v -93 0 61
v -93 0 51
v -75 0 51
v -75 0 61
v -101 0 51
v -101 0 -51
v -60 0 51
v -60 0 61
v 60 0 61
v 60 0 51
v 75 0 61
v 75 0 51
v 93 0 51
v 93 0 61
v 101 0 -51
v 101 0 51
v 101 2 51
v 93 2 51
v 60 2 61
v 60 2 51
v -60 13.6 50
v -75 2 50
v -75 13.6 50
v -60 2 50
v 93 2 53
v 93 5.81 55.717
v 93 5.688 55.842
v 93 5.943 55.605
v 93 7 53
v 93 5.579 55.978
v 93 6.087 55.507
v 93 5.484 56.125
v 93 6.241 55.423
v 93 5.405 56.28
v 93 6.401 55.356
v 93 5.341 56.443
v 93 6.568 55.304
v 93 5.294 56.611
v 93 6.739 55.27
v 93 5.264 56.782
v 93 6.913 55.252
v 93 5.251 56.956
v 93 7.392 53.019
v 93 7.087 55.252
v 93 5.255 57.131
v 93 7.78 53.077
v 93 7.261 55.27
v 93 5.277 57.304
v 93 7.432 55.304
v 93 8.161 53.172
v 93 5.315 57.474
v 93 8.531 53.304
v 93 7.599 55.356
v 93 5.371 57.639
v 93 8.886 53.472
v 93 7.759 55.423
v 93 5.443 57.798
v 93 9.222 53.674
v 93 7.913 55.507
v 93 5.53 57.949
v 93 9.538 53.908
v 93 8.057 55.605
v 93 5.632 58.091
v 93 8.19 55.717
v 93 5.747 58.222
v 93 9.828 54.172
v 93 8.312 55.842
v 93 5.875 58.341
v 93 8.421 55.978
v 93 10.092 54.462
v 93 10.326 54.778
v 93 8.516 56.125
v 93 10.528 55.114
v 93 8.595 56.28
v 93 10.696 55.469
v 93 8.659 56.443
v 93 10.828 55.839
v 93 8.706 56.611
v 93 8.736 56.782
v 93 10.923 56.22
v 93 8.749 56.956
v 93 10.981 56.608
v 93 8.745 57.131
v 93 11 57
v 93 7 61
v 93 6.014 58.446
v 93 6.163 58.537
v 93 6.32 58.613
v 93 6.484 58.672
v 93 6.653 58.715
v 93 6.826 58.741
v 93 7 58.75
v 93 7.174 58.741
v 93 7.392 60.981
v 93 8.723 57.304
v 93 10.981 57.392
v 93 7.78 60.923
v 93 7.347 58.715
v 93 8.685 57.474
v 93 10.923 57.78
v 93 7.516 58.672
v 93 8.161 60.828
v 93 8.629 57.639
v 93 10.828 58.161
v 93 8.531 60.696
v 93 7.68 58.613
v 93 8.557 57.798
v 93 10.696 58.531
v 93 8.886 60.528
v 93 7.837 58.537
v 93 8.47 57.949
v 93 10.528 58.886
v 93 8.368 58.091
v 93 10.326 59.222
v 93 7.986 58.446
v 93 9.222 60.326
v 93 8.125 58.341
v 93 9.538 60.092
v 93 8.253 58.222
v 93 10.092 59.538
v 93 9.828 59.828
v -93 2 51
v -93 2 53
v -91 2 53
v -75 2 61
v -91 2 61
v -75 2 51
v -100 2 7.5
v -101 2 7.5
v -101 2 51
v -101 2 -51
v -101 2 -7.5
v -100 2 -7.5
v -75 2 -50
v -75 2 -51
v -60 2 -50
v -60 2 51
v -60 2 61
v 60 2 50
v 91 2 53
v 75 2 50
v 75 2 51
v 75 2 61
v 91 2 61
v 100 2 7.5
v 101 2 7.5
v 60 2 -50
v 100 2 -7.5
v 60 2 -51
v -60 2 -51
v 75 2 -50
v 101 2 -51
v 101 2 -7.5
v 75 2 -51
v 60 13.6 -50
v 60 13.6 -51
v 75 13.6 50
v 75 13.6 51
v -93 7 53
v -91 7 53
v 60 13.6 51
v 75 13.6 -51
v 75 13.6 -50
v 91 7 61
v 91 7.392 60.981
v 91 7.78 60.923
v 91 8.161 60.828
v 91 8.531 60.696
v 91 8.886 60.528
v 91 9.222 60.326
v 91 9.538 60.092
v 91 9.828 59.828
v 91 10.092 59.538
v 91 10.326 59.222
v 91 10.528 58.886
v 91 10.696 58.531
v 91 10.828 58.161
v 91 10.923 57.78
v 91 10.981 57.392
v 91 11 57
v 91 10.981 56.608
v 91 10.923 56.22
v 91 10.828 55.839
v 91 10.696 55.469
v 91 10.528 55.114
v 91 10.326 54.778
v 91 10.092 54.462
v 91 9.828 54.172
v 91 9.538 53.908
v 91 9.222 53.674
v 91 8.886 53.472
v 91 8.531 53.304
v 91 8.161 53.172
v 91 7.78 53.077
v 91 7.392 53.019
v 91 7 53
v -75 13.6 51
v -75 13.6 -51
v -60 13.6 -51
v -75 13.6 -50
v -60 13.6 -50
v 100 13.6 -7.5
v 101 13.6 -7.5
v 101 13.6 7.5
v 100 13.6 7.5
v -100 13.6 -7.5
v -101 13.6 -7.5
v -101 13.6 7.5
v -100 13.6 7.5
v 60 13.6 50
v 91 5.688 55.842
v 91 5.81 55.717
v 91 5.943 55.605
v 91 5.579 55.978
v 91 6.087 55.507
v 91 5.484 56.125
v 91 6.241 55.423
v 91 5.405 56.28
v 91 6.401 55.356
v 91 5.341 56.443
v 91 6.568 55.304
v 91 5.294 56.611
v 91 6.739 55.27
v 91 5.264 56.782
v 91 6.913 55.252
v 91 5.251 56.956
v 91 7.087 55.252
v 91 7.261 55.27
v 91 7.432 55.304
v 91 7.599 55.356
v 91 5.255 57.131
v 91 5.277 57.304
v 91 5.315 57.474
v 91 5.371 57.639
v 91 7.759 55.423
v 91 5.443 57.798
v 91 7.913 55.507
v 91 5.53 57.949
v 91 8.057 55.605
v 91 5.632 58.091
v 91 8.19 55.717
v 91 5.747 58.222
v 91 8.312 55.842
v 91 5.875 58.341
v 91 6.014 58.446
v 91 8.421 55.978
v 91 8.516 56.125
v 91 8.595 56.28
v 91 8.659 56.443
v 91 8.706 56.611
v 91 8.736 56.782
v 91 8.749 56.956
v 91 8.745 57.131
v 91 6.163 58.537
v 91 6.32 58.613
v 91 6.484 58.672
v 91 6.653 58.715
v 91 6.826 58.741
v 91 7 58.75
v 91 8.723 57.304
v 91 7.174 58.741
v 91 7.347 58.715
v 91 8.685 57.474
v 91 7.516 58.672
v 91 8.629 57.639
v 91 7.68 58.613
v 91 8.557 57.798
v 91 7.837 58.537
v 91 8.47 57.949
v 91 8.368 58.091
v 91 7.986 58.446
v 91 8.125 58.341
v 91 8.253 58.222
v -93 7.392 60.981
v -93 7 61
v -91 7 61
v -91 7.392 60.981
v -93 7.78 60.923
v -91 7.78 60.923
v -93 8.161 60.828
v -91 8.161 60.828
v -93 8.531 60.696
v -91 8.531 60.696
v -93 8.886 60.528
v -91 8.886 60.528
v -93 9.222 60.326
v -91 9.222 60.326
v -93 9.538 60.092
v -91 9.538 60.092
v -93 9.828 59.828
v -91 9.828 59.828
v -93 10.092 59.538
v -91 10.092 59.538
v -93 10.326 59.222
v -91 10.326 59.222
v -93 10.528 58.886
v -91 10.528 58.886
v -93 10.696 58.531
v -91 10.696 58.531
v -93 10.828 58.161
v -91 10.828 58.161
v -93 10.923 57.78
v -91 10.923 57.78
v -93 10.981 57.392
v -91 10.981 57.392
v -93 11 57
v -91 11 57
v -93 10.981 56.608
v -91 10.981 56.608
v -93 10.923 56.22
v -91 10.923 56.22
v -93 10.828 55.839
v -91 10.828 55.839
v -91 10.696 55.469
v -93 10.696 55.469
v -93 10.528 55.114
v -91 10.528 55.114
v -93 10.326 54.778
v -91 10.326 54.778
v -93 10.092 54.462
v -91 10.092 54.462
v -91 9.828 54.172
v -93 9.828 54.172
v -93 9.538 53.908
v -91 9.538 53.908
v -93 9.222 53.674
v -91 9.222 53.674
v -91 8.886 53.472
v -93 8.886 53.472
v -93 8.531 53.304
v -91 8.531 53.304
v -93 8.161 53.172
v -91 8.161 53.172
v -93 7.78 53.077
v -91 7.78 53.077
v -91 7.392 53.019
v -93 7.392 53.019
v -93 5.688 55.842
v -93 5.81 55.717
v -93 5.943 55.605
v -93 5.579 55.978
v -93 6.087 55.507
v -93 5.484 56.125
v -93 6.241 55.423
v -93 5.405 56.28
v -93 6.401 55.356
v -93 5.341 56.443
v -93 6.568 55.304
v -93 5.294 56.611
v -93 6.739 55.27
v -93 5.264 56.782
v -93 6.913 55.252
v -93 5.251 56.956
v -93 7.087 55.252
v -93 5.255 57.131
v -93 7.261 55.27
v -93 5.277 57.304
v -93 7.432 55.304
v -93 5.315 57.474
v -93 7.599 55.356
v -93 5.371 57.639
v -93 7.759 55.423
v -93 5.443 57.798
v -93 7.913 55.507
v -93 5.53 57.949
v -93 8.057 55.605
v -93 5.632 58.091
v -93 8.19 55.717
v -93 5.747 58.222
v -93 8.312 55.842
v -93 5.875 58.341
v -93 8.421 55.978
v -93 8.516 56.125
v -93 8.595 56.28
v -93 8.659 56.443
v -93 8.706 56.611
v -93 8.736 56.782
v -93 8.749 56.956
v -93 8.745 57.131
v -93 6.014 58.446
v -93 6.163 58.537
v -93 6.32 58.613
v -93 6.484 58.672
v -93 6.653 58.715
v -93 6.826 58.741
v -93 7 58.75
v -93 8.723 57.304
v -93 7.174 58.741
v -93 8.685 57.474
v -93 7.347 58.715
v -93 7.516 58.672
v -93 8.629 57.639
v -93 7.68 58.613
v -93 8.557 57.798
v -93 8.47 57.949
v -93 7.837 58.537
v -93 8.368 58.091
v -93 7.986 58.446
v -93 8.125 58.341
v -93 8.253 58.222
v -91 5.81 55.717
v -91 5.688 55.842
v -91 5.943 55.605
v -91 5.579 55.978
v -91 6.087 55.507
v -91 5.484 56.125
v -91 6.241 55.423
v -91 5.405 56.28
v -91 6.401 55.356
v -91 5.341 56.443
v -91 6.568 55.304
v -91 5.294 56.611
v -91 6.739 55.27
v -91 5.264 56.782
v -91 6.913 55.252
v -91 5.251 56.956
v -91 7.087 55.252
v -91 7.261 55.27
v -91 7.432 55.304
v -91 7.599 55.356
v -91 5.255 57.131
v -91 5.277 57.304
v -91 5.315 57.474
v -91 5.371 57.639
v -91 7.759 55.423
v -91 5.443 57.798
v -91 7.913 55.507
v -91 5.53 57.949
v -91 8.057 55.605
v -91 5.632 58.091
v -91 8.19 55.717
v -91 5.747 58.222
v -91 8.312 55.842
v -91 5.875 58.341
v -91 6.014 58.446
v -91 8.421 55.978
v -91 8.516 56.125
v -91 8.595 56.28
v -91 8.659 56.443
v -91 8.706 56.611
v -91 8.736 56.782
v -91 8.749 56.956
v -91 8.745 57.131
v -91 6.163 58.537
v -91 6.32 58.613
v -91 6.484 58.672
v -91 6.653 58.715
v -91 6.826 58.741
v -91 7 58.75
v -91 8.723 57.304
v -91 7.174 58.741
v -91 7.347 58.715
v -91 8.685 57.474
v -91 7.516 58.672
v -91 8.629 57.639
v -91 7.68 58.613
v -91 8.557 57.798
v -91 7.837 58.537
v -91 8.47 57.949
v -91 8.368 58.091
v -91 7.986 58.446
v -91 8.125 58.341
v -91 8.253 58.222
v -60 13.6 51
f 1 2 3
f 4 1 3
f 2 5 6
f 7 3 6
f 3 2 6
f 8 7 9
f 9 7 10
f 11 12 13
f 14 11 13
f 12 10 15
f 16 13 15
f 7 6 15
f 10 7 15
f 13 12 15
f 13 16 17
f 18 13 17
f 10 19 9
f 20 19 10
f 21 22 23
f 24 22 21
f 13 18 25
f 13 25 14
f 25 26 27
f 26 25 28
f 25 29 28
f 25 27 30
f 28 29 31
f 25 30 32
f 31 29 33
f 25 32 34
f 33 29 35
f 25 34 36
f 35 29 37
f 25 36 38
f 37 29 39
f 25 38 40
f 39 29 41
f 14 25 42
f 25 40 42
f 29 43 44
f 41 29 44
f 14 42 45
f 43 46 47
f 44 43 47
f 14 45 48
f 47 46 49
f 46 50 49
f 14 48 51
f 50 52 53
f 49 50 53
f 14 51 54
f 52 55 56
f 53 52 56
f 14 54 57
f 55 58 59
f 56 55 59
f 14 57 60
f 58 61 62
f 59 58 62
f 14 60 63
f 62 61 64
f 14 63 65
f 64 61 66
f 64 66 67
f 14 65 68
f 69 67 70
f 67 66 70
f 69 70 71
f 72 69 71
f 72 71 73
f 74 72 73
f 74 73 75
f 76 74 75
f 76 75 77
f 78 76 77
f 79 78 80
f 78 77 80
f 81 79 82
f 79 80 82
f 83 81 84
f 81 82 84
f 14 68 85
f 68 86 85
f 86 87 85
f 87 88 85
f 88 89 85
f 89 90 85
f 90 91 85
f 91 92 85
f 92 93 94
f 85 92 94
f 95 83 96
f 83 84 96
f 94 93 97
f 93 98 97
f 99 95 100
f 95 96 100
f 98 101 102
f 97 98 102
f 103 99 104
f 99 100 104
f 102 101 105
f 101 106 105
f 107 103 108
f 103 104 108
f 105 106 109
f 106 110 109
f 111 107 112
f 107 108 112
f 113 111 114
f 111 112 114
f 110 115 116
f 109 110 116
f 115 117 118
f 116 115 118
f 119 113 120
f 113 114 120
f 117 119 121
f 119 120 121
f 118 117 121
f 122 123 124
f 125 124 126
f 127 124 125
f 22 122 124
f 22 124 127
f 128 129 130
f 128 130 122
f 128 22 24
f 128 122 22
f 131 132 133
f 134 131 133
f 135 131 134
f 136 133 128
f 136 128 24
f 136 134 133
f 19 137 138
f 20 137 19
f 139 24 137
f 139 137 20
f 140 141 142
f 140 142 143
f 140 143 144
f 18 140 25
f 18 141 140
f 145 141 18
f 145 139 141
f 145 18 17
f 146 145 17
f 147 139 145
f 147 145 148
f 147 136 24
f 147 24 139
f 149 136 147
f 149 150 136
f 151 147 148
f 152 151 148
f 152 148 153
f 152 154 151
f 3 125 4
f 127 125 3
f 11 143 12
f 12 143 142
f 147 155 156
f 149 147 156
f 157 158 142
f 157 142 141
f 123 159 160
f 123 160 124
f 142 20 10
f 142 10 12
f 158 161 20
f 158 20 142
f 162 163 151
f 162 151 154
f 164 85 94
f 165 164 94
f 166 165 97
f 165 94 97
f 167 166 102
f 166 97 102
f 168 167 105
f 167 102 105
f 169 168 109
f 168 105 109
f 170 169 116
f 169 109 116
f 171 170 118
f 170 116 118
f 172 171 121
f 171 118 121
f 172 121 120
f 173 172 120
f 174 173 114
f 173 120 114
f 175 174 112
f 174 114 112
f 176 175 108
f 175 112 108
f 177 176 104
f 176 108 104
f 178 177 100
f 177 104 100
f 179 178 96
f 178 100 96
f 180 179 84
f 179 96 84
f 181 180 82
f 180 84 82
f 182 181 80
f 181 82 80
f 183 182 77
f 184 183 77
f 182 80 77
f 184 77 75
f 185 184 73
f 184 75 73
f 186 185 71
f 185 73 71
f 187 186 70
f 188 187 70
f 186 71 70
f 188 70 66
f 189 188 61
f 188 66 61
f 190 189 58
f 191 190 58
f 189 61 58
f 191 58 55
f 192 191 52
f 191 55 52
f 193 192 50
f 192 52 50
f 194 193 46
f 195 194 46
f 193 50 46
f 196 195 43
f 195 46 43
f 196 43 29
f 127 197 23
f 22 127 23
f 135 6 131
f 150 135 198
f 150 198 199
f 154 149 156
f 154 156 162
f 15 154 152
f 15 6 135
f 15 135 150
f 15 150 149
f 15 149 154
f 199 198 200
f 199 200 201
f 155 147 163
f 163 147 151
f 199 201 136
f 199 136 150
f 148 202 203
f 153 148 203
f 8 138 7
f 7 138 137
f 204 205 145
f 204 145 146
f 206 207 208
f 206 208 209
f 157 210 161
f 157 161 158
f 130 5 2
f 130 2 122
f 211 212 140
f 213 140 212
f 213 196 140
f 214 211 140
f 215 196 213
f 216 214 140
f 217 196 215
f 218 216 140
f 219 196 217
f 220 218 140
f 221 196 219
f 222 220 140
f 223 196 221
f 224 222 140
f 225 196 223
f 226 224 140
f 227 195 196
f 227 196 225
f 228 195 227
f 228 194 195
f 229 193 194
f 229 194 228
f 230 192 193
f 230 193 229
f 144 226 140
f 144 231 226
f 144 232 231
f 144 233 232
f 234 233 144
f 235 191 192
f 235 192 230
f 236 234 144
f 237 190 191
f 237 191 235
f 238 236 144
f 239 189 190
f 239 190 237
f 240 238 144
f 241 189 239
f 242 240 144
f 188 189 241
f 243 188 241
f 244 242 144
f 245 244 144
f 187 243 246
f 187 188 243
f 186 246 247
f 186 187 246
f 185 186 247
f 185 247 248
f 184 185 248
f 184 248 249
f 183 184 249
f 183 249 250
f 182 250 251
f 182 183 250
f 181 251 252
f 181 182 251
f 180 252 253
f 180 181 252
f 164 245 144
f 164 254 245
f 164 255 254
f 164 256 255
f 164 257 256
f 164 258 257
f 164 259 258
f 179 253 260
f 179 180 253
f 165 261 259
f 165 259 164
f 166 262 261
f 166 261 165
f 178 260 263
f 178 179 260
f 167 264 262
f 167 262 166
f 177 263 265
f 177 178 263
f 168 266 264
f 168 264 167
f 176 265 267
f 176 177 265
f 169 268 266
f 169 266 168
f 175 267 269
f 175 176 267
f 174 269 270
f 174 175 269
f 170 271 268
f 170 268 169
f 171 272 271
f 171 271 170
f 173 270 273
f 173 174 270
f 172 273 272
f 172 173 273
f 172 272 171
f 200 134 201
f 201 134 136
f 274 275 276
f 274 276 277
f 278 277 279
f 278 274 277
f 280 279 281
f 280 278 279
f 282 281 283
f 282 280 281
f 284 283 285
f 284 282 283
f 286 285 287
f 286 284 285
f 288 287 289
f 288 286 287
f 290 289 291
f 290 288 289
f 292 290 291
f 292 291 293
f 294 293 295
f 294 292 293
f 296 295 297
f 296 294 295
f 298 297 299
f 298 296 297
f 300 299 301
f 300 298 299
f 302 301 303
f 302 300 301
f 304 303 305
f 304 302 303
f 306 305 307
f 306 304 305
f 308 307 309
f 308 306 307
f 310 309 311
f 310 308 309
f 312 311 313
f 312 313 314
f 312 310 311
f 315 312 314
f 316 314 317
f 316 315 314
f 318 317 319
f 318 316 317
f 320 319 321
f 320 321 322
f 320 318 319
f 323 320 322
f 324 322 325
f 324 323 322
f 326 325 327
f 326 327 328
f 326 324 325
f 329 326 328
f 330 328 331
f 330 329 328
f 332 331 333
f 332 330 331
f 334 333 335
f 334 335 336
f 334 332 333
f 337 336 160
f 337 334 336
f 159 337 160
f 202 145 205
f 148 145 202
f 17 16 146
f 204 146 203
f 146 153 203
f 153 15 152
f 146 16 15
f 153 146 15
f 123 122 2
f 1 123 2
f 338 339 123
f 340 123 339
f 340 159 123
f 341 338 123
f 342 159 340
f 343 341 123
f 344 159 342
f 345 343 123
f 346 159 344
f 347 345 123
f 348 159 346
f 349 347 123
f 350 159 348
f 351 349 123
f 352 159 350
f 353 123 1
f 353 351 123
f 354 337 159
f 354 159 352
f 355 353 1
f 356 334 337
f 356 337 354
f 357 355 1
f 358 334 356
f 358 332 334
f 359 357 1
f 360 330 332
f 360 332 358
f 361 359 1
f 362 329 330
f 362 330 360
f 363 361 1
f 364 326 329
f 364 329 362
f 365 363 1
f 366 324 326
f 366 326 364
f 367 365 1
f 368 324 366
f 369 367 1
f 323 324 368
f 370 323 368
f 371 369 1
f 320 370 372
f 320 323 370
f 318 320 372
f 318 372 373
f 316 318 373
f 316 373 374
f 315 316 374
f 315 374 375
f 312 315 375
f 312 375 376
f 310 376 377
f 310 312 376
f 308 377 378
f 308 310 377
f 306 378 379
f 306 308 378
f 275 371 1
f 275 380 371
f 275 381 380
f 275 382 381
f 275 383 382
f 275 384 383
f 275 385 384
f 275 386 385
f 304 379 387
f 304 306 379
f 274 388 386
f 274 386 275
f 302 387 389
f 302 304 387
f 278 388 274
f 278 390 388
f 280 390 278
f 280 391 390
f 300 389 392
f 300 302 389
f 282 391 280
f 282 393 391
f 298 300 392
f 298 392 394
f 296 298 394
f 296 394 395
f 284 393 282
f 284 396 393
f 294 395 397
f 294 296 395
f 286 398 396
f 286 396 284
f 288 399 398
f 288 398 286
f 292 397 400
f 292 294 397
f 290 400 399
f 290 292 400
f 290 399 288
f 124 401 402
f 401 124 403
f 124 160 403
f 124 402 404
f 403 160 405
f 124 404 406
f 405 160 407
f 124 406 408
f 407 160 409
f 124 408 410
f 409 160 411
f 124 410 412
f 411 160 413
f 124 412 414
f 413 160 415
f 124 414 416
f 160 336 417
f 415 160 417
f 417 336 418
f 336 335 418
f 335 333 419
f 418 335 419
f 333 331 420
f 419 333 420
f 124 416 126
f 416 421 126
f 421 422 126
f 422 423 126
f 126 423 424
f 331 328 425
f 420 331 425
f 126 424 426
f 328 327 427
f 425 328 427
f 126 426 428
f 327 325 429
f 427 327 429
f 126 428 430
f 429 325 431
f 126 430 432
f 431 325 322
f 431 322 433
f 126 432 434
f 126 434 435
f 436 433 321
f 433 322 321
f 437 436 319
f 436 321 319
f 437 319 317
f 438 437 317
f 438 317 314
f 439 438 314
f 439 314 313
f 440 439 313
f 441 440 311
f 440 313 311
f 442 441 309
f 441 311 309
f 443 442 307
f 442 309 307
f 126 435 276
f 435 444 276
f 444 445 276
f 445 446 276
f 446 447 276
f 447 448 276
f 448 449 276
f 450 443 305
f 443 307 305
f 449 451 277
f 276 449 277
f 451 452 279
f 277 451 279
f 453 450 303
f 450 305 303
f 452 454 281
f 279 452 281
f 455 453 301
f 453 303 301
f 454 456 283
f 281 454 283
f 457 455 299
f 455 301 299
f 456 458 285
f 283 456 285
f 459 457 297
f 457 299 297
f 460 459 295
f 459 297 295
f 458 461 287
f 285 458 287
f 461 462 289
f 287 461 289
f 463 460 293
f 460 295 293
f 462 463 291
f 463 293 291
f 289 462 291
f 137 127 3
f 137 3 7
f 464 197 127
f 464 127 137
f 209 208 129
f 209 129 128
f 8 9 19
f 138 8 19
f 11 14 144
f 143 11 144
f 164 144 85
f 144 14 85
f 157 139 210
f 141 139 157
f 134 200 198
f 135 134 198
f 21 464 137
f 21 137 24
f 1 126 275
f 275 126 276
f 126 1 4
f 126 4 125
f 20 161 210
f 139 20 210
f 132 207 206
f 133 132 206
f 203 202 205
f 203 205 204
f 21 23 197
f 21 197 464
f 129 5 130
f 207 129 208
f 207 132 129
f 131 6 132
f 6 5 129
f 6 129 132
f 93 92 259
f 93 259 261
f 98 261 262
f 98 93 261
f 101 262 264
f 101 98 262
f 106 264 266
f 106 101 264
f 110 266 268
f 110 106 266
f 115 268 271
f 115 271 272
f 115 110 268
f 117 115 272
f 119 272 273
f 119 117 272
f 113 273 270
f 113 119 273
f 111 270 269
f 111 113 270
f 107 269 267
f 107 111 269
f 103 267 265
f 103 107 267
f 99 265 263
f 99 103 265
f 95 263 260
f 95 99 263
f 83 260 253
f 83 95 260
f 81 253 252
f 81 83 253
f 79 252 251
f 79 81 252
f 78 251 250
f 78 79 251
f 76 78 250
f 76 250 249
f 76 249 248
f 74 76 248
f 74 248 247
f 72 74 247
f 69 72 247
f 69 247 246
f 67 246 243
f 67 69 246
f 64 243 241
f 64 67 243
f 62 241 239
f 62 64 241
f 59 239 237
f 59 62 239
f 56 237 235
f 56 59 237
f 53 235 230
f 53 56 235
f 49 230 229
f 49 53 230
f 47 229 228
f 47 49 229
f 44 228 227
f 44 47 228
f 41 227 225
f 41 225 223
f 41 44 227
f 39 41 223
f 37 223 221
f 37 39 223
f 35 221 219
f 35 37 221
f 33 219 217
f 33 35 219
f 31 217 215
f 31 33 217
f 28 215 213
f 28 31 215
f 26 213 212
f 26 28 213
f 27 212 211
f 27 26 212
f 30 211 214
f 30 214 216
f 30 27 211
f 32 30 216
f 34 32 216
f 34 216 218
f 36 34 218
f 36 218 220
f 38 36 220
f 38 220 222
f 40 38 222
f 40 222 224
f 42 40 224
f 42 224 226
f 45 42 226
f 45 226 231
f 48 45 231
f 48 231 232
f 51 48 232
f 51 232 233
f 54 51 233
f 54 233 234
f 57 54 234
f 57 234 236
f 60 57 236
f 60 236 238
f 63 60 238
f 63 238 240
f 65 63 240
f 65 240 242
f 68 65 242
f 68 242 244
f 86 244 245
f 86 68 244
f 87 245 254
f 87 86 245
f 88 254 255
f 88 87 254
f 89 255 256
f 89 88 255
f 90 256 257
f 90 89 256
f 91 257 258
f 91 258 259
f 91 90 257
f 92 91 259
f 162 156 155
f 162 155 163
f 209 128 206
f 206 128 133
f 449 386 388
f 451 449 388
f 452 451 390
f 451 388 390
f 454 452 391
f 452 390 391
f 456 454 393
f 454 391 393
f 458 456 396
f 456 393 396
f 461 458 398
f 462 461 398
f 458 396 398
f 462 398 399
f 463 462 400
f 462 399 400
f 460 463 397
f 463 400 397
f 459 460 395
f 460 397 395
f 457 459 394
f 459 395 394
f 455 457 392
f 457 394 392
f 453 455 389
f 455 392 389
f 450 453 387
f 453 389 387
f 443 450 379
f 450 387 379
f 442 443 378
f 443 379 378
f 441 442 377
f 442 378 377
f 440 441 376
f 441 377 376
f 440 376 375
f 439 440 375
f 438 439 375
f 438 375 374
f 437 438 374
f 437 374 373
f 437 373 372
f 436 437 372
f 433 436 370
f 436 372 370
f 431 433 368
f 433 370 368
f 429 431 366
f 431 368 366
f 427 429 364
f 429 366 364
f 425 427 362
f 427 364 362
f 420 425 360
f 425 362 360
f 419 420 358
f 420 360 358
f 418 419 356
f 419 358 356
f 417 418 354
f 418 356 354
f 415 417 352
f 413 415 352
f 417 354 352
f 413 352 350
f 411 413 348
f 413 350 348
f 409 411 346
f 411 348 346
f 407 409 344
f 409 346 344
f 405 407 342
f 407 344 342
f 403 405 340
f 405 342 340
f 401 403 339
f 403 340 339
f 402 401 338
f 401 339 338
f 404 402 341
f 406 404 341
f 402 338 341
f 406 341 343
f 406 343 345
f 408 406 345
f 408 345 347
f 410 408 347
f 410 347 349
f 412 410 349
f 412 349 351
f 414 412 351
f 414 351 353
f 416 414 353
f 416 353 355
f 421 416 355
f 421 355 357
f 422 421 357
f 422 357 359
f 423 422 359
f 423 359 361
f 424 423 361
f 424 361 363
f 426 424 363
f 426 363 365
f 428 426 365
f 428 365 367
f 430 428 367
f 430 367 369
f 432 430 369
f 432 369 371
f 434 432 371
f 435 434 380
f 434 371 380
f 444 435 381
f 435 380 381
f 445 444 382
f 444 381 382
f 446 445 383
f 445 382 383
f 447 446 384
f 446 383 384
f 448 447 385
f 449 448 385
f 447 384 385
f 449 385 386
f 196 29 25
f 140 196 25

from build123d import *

# Parameters (mm, degrees)
SKETCH1_W           = 202
SKETCH1_H           = 102
BOSS_EXTRUDE1_DEPTH = 2
SKETCH2_W           = 15
SKETCH2_H           = 1
SKETCH2_W_2         = 1
SKETCH2_H_2         = 15
BOSS_EXTRUDE2_DEPTH = 11.6
SKETCH3_W           = 202
SKETCH3_H           = 2
BOSS_EXTRUDE3_DEPTH = 10
SKETCH10_W          = 10
SKETCH10_H          = 2
CUT_EXTRUDE1_DEPTH  = 8
SKETCH12_R          = 1.75
BOSS_EXTRUDE5_DEPTH = 2
SKETCH13_W          = 15
SKETCH13_H          = 10
CUT_EXTRUDE2_DEPTH  = 119.560364372


with BuildPart() as part:
    # Sketch1 → Boss-Extrude1 (new body)
    with BuildSketch(Plane(origin=(0, 0, 0), x_dir=(1, 0, 0), z_dir=(0, 1, 0))):
        Rectangle(SKETCH1_W, SKETCH1_H)
    extrude(amount=BOSS_EXTRUDE1_DEPTH)

    # Sketch2 → Boss-Extrude2 (add)
    with BuildSketch(Plane(origin=(0, 2, 0), x_dir=(1, 0, 0), z_dir=(0, 1, 0))):
        with Locations((-67.5, 50.5)):
            Rectangle(SKETCH2_W, SKETCH2_H)
        with Locations((-67.5, -50.5)):
            Rectangle(SKETCH2_W, SKETCH2_H)
        with Locations((67.5, -50.5)):
            Rectangle(SKETCH2_W, SKETCH2_H)
        with Locations((67.5, 50.5)):
            Rectangle(SKETCH2_W, SKETCH2_H)
        with Locations((100.5, 0)):
            Rectangle(SKETCH2_W_2, SKETCH2_H_2)
        with Locations((-100.5, 0)):
            Rectangle(SKETCH2_W_2, SKETCH2_H_2)
    extrude(amount=BOSS_EXTRUDE2_DEPTH)

    # Sketch3 → Boss-Extrude3 (add)
    with BuildSketch(Plane.XY.offset(51)):
        with Locations((0, 1)):
            Rectangle(SKETCH3_W, SKETCH3_H)
    extrude(amount=BOSS_EXTRUDE3_DEPTH)

    # Sketch10 → Cut-Extrude1 (cut)
    with BuildSketch(Plane.ZY.offset(101)):
        with Locations((56, 1)):
            Rectangle(SKETCH10_W, SKETCH10_H)
    cut_extrude1 = extrude(amount=-CUT_EXTRUDE1_DEPTH, mode=Mode.SUBTRACT)

    # Mirror3: Cut-Extrude1 across plane
    add(cut_extrude1.mirror(Plane.ZY), mode=Mode.SUBTRACT)

    # Sketch12 → Boss-Extrude5 (add)
    with BuildSketch(Plane.ZY.offset(93)):
        with BuildLine():
            Line((61, 2), (61, 7))
            ThreePointArc((61, 7), (57, 11), (53, 7))
            Line((53, 7), (53, 2))
            Line((53, 2), (61, 2))
        make_face()
        with Locations((57, 7)):
            Circle(SKETCH12_R, mode=Mode.SUBTRACT)
    boss_extrude5 = extrude(amount=-BOSS_EXTRUDE5_DEPTH)

    # Mirror4: Boss-Extrude5 across plane
    add(boss_extrude5.mirror(Plane.ZY))

    # Sketch13 → Cut-Extrude2 (cut, through all)
    with BuildSketch(Plane(origin=(0, 2, 0), x_dir=(1, 0, 0), z_dir=(0, 1, 0))):
        with Locations((-67.5, -56)):
            Rectangle(SKETCH13_W, SKETCH13_H)
        with Locations((67.5, -56)):
            Rectangle(SKETCH13_W, SKETCH13_H)
    extrude(amount=-CUT_EXTRUDE2_DEPTH, mode=Mode.SUBTRACT)


solid = part.part
